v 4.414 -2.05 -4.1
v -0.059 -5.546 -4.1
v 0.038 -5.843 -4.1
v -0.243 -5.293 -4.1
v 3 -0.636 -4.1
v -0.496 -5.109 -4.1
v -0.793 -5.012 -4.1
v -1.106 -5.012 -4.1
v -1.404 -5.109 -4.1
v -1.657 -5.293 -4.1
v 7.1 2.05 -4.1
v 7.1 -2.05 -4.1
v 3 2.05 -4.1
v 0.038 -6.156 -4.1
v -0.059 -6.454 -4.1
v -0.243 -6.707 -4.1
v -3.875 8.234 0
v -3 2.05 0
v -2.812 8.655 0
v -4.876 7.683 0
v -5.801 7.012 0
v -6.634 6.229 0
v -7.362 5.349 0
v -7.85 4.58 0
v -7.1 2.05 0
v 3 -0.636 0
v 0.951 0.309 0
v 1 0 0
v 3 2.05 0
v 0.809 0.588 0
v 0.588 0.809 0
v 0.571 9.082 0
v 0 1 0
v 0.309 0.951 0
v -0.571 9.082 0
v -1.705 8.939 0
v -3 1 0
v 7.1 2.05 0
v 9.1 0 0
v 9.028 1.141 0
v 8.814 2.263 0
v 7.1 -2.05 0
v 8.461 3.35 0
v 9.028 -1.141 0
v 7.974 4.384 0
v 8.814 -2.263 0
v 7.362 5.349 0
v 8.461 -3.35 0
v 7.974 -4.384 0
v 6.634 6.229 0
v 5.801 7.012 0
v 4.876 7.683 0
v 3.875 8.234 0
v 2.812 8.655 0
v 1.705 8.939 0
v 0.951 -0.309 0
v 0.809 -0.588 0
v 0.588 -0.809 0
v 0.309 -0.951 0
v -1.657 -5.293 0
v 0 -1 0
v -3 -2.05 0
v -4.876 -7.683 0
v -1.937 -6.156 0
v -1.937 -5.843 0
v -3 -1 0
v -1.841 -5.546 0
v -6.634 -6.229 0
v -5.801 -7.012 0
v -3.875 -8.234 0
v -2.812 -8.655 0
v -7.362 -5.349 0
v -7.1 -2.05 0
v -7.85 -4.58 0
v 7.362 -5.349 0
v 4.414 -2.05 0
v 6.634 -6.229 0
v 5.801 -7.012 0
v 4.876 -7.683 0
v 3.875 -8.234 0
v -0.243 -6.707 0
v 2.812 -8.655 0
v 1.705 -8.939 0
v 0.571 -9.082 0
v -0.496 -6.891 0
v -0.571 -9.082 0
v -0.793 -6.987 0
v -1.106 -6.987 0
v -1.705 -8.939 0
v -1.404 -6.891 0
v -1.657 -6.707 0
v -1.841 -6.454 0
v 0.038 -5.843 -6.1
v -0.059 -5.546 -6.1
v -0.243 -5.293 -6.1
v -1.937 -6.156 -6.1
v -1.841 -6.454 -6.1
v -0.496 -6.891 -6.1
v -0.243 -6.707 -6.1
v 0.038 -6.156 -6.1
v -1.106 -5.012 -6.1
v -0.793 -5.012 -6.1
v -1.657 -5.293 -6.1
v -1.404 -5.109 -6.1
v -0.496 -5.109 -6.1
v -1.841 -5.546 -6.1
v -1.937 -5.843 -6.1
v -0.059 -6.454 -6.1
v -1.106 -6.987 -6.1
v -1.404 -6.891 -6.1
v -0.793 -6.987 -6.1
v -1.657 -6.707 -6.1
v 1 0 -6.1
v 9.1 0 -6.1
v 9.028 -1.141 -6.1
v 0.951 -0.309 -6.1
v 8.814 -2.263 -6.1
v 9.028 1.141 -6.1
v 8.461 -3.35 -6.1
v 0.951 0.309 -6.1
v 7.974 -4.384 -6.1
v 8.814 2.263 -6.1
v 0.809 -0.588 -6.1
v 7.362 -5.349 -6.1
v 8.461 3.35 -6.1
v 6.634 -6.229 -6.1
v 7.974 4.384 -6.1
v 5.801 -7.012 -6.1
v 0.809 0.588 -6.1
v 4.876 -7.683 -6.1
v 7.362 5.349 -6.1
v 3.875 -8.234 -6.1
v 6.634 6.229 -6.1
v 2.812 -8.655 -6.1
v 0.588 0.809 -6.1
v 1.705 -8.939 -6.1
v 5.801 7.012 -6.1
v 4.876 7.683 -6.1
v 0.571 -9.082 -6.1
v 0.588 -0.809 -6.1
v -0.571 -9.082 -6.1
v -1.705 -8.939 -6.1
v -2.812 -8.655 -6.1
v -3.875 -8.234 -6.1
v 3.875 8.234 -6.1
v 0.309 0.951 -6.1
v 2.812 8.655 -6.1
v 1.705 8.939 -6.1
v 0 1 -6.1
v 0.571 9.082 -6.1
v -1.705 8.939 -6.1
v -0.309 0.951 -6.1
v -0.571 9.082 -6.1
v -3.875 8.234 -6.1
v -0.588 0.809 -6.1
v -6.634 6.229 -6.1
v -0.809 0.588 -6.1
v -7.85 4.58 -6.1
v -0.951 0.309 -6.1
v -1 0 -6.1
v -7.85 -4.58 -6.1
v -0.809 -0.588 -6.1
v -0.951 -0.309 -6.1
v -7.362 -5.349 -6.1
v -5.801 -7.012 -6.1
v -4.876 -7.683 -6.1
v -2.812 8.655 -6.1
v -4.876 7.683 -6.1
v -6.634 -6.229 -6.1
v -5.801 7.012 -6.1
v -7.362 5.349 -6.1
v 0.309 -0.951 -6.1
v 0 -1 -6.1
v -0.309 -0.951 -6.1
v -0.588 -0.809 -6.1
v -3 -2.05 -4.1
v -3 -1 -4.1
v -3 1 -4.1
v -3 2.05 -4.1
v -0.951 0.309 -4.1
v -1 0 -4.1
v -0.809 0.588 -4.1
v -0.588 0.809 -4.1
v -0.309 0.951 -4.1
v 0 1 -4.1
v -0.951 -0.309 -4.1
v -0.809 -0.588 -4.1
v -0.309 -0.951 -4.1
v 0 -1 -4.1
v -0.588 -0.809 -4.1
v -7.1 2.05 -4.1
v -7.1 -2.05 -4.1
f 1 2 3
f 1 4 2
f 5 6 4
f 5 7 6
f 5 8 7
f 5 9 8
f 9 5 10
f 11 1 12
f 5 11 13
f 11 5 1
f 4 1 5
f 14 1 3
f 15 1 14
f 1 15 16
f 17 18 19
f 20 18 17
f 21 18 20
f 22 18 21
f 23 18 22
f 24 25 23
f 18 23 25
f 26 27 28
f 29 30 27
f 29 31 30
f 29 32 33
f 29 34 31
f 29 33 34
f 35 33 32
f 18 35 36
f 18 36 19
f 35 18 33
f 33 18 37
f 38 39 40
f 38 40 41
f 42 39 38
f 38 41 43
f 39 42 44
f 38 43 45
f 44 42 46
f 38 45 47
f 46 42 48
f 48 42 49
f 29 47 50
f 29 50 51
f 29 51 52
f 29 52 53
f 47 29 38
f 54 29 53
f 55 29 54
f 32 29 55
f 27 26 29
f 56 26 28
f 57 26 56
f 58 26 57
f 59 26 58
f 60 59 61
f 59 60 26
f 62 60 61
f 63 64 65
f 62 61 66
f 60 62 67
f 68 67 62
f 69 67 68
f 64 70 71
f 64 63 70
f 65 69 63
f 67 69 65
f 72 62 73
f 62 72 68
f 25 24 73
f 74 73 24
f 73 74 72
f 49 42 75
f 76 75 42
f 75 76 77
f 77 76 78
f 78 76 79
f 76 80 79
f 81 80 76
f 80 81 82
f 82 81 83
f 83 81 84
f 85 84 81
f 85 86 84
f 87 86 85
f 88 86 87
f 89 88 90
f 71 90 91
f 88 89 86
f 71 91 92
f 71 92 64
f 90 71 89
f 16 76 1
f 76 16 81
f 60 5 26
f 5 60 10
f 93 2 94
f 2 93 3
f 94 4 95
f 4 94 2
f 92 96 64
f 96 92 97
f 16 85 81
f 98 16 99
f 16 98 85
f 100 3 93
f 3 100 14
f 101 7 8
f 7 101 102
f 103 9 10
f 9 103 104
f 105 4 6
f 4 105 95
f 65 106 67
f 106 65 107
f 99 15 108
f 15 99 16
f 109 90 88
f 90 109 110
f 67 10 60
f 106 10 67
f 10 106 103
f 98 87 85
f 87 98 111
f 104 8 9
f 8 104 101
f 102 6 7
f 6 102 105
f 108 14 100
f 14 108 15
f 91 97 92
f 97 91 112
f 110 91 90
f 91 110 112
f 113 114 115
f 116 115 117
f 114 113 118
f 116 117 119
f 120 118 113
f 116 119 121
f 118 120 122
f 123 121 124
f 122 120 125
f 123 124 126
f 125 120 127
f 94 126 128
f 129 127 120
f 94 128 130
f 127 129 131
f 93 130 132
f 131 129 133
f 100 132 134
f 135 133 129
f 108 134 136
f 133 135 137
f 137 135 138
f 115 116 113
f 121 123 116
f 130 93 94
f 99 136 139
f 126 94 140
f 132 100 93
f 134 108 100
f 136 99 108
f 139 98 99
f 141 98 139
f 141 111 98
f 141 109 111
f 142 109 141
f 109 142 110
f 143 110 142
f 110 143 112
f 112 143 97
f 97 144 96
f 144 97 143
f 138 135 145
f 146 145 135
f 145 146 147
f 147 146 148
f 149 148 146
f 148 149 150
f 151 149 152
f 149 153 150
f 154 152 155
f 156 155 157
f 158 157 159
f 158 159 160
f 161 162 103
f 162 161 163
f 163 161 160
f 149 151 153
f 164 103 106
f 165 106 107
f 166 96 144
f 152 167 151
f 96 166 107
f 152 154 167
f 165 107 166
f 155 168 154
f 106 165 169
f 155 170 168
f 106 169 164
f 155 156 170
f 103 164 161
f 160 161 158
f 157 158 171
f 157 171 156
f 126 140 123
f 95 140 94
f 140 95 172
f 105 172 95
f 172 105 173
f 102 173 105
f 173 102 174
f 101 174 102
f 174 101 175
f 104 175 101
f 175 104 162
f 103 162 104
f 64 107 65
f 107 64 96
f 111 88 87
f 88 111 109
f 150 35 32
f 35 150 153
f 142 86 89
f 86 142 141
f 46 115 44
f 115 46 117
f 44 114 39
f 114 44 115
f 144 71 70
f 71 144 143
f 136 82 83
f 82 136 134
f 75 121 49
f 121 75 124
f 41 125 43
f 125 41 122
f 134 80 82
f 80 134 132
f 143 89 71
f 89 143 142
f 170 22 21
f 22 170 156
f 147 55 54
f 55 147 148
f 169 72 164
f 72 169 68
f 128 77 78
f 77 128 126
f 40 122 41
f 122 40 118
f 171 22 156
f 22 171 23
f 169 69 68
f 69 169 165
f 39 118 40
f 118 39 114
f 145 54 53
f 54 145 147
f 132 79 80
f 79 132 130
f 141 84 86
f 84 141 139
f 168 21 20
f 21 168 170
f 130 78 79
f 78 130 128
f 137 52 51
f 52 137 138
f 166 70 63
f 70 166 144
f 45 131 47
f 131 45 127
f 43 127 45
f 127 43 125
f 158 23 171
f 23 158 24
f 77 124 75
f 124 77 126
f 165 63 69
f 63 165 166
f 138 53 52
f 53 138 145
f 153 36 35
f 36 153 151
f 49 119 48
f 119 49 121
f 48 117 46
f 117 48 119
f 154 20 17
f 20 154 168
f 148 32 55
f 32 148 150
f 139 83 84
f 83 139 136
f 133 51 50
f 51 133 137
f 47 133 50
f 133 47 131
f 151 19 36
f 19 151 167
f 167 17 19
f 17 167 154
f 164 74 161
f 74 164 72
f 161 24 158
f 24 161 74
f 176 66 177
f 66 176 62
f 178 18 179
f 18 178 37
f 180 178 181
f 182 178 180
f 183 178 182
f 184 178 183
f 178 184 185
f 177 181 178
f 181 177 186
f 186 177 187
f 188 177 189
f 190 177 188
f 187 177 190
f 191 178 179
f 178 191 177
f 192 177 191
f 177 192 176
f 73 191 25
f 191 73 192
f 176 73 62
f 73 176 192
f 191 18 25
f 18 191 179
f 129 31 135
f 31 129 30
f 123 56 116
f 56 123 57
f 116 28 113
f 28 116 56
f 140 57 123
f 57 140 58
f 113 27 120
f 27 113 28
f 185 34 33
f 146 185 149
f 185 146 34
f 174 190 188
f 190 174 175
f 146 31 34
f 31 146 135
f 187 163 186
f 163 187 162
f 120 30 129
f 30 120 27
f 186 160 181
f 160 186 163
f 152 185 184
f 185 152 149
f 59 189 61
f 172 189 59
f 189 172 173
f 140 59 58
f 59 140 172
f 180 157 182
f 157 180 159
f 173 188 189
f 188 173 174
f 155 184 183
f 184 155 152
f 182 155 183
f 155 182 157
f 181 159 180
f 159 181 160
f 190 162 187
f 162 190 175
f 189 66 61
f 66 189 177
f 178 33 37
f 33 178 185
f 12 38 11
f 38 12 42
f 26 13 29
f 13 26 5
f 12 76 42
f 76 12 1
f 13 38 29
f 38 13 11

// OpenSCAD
/*
 * A holder to make miniature spotlights out of LEDs.
 *
 * This uses square magnets to make contact with a power supply.
 * All units here are in mm.
 */

// Size of the magnets.
magnet_size=4.1;

// Distance from the center to the edge of the magnets.
center_offset=3;

// Diameter of the center hole.
center_hole=2;

// Height of the housing above the magnet.
height_above_magnets=2;

// Distance from the edge of the magnet to the edge of the housing.
magnet_to_wall=2;

// Size of the polarity keying.
key_size=1.25;

// Length of the resistor channel.
resistor_x=7;
// Width of the resistor channel.
resistor_y=2;

// Size of the hole for the resistor.
resistor_hole=2;


resistor_z=magnet_size;

top_h=height_above_magnets;

body_radius = magnet_size + center_offset + magnet_to_wall;
body_height=magnet_size+top_h;


rotate([-180,0,0]){
	difference(){
		// The main body of the holder.
		cylinder(h=body_height,r=body_radius,$fn=50);

		// Polarity key.
		translate([-body_radius,-body_radius,0])
			cube([key_size, body_radius*2, body_height]);

		// Left magnet (positive).
		translate([-magnet_size/2-center_offset,0,magnet_size/2]){
			magnet();
		}
		// Hole in the center for thick wire.
		cylinder(h=magnet_size+top_h,r=center_hole/2,$fn=20);

		// Channel bridging center to magnet.
		/*
		translate([0,0,magnet_size]){
			rotate([0,-90,0]){
				cylinder(h=center_offset+magnet_size,r=center_hole/2,$fn=20);
			}
		}
		*/

		// Channel to pass wire to center hole.
		translate([-4,-center_hole/2,0])
			cube([4,center_hole,magnet_size]);

		// Right magnet (negative).
		translate([magnet_size/2+center_offset,0,magnet_size/2]){
			magnet();
		}

		// Hole for resistor.
		translate([center_offset+resistor_y/2,magnet_size/2-resistor_y/2,0]){
			rotate([0,0,-45]){
				translate([-resistor_x,-resistor_y/2,0]){
						cube([resistor_x,resistor_y,resistor_z]);

					// Hole for wire on other side of resistor.
					translate([0,resistor_y/2,0]){
						cylinder(h=magnet_size+top_h,r=resistor_hole/2,$fn=20);
					}
				}
			}
		}
	}
}

module magnet(){
	cube([magnet_size,magnet_size,magnet_size],center=true);
}
